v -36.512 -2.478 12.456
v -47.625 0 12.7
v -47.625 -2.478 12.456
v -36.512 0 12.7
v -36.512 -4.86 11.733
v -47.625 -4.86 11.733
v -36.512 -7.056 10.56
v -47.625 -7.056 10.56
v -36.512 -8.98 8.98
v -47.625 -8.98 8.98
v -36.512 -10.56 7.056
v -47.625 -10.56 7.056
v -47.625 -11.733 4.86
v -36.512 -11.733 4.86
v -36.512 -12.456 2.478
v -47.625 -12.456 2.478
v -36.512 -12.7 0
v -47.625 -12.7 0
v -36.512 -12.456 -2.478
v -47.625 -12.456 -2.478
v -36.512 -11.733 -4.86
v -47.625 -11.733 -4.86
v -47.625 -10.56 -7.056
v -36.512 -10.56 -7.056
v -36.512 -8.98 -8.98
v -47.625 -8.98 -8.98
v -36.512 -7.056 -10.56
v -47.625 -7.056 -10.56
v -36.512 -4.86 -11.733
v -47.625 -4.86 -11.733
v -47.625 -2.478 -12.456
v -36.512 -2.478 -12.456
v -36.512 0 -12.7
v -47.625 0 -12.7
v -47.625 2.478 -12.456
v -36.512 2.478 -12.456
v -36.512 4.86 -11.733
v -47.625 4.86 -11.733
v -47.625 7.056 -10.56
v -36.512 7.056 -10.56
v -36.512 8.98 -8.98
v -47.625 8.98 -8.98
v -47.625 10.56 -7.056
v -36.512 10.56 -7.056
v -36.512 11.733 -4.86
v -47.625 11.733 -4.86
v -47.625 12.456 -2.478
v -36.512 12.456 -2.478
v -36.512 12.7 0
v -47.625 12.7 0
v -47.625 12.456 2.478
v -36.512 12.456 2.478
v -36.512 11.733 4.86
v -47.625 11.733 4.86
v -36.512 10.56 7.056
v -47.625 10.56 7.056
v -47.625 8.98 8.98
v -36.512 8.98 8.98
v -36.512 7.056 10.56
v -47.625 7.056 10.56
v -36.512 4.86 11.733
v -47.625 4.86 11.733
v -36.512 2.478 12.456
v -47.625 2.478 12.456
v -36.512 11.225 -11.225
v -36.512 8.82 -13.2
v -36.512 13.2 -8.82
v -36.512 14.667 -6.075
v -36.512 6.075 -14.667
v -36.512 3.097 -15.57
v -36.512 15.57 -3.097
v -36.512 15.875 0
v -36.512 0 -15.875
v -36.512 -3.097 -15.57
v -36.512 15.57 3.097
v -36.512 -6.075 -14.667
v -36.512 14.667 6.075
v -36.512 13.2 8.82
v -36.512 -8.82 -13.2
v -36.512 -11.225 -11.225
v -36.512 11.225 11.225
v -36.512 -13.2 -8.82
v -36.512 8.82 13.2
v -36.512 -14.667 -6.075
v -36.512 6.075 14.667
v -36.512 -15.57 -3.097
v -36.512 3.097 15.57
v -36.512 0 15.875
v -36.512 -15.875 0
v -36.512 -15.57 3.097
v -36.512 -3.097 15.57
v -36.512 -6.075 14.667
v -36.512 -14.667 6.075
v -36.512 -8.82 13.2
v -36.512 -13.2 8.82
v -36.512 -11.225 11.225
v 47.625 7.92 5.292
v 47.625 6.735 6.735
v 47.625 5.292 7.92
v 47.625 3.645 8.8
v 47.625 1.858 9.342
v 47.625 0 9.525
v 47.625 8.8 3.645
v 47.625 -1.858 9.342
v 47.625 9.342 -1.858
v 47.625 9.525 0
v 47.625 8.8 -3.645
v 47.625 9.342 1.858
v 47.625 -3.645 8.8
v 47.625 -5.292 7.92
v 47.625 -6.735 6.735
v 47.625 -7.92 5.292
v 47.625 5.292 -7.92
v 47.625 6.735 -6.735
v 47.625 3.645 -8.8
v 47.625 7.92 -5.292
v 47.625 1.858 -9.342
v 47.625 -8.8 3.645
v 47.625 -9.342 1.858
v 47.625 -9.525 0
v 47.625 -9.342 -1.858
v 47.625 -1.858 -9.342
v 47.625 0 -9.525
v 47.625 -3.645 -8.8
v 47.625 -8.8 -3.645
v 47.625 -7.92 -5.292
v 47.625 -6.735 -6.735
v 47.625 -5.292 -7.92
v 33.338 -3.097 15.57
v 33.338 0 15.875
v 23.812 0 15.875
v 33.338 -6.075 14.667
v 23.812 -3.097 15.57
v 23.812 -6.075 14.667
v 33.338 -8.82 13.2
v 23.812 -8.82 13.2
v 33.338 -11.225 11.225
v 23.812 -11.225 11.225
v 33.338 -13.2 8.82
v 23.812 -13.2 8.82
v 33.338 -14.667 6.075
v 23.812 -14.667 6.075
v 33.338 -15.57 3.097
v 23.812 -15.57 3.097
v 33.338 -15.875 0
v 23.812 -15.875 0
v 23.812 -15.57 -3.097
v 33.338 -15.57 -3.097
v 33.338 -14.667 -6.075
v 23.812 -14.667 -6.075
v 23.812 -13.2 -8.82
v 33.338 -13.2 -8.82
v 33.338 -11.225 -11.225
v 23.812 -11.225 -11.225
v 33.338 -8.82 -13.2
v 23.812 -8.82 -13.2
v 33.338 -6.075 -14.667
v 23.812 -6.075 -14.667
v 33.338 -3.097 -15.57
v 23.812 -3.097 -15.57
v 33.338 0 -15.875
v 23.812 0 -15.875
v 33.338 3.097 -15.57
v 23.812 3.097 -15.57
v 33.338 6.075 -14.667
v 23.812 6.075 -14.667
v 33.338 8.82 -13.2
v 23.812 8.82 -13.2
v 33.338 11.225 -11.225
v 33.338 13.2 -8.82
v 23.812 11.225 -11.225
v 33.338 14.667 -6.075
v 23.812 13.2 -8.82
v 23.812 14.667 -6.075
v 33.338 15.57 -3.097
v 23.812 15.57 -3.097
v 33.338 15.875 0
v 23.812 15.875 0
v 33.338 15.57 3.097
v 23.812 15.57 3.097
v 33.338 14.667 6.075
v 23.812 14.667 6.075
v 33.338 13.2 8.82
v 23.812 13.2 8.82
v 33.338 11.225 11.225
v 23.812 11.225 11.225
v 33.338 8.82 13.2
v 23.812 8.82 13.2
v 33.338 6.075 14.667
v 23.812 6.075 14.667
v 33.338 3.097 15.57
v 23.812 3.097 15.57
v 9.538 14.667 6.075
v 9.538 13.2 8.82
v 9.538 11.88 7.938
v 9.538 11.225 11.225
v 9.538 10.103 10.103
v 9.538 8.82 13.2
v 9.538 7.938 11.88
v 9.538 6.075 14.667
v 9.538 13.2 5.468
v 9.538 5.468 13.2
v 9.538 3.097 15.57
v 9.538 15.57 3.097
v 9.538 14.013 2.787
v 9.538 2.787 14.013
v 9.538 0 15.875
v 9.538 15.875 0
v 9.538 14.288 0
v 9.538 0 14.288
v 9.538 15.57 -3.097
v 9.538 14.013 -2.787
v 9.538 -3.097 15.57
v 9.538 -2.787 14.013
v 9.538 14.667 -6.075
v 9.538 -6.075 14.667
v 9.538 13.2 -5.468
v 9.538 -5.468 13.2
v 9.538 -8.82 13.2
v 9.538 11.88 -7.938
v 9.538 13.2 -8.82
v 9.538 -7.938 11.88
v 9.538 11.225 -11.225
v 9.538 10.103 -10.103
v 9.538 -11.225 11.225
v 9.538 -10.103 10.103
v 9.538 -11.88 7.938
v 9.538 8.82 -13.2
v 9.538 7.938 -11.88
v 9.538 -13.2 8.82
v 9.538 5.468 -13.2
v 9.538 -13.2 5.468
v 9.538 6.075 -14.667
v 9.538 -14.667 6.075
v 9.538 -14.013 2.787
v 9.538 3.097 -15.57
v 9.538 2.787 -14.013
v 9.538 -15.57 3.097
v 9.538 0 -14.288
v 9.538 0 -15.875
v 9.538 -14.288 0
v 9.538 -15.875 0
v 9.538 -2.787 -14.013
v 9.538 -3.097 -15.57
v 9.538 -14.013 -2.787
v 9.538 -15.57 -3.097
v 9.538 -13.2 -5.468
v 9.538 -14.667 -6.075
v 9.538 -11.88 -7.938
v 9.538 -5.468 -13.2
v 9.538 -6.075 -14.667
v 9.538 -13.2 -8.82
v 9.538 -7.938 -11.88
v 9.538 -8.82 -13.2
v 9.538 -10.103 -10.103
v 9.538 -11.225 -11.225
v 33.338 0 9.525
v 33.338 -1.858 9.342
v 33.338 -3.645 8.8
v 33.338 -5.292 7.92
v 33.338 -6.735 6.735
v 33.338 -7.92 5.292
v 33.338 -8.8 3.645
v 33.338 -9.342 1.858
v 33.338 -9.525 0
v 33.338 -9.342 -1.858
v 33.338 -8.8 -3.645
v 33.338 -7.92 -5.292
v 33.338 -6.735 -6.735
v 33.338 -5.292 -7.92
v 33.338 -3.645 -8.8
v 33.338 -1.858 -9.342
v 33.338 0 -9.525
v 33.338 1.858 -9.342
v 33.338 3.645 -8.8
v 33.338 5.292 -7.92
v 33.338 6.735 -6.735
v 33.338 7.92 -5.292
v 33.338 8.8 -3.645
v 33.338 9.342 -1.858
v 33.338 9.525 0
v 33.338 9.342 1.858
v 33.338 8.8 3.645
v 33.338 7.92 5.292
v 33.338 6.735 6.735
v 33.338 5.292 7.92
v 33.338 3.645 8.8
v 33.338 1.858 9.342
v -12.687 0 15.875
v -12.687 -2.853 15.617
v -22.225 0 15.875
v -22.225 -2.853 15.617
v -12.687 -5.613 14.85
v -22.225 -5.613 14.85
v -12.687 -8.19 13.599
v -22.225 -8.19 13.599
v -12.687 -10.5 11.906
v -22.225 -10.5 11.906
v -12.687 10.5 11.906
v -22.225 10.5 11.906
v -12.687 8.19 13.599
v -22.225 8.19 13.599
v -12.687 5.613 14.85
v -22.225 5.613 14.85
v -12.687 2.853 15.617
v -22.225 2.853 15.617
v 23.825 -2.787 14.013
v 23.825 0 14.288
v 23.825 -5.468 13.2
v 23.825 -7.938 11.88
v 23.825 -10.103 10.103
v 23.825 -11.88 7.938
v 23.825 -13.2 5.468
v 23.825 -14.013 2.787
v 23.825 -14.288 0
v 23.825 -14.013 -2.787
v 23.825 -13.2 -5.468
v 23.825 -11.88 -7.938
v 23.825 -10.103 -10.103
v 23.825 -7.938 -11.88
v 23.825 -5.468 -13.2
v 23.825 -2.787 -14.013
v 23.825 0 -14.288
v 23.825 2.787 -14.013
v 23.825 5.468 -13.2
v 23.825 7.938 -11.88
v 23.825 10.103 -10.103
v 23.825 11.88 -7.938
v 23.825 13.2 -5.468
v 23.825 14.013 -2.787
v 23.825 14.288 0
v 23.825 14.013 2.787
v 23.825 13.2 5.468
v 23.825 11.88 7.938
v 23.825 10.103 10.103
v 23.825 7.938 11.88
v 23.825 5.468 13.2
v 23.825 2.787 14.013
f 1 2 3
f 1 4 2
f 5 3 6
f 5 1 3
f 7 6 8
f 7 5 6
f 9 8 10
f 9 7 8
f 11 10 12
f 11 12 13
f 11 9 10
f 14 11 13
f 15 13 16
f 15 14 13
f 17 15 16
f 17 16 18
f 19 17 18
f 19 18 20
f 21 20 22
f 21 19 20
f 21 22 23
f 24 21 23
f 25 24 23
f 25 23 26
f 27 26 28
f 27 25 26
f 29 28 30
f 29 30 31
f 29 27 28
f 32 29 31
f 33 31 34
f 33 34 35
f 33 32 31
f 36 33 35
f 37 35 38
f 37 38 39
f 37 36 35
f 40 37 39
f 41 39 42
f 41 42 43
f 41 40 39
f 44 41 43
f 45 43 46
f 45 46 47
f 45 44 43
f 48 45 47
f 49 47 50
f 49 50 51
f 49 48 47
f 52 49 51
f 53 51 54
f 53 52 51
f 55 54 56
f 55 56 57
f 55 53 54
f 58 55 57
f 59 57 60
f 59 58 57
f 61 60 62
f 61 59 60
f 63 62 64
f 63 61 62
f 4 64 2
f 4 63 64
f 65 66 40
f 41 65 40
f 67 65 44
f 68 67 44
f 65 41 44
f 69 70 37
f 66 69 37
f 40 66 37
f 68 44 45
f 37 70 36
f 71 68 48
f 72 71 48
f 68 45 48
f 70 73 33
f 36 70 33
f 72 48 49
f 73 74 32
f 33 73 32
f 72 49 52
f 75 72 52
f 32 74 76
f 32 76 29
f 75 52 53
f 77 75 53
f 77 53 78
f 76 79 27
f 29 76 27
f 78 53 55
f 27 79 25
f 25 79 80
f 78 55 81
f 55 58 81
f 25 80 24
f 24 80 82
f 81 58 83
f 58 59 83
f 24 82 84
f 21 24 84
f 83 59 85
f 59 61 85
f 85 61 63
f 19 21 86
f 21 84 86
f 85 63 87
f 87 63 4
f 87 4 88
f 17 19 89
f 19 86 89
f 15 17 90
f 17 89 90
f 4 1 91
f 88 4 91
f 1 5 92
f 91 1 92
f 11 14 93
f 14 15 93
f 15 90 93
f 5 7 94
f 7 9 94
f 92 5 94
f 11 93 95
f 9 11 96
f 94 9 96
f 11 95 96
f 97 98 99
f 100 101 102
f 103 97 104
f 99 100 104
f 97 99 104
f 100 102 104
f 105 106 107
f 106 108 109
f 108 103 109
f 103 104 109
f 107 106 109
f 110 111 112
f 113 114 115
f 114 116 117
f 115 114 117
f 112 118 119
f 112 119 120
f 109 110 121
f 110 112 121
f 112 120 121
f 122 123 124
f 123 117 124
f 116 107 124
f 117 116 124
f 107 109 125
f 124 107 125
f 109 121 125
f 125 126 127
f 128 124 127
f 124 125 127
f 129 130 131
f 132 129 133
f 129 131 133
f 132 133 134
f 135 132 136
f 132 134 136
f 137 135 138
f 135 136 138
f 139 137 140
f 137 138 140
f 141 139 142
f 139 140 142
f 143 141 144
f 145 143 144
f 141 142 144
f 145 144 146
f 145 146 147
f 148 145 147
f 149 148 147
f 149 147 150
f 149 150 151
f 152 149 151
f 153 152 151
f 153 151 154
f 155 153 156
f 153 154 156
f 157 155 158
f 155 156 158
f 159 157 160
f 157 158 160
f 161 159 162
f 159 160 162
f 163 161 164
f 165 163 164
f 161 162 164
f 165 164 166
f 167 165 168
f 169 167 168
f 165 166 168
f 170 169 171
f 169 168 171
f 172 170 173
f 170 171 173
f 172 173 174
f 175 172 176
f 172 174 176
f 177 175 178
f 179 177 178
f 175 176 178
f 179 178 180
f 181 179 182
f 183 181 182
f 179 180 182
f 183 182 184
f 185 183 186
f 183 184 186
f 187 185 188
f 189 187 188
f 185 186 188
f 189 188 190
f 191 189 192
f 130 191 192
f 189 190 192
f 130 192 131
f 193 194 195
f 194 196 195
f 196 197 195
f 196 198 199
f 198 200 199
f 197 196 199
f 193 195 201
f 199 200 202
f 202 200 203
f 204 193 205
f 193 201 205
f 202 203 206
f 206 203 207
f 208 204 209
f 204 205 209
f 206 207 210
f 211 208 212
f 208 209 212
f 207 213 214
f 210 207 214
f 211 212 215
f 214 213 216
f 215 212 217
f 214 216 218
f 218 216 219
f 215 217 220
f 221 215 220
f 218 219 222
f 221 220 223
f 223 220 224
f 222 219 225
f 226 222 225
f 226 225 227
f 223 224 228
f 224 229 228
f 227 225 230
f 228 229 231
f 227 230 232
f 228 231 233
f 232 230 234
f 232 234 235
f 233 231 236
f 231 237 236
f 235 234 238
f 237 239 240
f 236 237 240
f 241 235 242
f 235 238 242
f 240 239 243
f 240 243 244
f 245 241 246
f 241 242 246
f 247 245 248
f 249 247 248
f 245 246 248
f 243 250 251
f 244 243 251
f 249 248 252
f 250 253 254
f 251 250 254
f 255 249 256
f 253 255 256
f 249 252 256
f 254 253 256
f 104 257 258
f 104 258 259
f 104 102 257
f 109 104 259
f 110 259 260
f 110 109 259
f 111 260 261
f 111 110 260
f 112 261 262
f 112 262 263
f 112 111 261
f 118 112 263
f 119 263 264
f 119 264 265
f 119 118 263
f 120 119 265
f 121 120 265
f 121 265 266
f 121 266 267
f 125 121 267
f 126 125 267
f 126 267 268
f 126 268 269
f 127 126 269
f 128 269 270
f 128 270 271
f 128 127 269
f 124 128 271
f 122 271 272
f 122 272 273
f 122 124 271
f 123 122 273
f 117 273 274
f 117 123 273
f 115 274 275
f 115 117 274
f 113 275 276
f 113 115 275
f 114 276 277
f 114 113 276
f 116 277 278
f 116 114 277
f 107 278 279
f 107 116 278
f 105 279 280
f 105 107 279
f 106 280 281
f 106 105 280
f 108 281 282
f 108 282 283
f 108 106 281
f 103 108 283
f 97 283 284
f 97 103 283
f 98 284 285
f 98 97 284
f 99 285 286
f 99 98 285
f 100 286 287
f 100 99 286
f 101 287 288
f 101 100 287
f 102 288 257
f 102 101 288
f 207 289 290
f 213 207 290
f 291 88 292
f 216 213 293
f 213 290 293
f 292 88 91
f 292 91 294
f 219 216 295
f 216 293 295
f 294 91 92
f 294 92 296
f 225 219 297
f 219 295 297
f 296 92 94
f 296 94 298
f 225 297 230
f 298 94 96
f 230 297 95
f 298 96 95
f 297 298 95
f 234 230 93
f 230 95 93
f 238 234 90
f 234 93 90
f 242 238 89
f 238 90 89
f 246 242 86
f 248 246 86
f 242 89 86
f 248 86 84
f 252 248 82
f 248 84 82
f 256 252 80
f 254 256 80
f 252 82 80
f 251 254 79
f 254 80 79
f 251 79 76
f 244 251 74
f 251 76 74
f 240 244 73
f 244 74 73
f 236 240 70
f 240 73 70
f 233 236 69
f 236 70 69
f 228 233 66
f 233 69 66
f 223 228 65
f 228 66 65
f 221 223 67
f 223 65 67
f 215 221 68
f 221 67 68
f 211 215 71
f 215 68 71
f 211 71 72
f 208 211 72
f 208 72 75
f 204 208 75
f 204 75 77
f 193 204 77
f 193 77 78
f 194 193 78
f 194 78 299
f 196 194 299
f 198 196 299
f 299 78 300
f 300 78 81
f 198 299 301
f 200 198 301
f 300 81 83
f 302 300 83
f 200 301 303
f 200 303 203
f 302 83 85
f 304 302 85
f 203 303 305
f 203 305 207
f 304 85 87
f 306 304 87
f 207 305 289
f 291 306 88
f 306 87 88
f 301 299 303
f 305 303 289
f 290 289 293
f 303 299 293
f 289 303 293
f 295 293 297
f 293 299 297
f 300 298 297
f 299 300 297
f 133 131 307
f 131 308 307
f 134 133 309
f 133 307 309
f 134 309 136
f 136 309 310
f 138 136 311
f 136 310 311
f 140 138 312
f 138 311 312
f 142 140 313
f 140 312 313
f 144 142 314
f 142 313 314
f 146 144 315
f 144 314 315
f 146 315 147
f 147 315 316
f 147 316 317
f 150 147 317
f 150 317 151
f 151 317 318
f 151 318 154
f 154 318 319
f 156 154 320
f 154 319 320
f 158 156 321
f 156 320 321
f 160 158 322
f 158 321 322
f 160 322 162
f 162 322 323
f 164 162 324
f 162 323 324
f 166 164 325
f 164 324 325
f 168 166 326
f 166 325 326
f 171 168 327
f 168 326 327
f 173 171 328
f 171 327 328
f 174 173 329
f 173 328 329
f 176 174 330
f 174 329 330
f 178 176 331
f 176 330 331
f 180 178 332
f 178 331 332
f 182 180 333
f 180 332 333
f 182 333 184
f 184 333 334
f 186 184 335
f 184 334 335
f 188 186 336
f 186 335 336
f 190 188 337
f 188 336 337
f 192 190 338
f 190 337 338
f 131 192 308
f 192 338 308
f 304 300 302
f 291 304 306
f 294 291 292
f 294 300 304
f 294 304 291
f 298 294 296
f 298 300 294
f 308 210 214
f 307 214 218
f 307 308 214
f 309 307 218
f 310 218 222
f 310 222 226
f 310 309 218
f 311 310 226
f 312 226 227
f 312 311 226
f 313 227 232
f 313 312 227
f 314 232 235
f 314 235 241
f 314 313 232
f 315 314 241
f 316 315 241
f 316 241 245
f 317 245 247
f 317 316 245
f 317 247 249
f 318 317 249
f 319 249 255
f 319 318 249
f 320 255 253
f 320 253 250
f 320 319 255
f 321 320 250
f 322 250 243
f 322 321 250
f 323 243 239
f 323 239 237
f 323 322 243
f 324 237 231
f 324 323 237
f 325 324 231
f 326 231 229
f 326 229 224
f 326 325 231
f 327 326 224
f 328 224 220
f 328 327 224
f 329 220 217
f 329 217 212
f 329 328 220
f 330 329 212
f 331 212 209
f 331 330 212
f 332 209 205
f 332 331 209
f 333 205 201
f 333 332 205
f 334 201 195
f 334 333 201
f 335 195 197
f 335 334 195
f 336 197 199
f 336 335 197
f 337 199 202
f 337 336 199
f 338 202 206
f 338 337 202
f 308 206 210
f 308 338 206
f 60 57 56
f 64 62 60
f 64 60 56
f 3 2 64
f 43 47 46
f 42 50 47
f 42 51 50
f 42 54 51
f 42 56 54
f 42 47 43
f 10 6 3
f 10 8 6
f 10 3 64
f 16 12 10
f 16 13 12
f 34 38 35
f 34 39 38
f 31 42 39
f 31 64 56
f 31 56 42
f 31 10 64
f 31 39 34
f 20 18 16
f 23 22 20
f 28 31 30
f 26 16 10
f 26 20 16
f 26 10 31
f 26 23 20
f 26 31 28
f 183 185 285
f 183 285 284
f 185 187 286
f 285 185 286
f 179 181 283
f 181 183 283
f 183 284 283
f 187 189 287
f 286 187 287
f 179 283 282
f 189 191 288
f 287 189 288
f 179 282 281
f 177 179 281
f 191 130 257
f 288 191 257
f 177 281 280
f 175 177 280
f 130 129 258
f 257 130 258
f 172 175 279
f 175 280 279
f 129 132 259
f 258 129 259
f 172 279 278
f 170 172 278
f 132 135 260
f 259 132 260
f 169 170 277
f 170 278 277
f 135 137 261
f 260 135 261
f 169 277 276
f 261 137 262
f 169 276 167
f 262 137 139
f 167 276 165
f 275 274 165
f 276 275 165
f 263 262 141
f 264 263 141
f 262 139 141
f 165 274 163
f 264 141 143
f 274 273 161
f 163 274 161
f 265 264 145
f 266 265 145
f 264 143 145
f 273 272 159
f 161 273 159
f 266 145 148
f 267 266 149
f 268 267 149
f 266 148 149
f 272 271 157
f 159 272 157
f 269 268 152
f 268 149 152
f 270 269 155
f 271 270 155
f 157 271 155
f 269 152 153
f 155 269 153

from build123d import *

# Parameters (mm, degrees)
F0_W     = 11.1125
F0_H     = 12.7
F0_W_2   = 14.2875
F0_H_2   = 14.2875
F0_H_3   = 9.525
F2_W     = 9.5377
F2_H     = 23.704022
F3_DEPTH = 63.5


with BuildPart() as f1:
    # F0 (on Front) → F1 (revolve)
    with BuildSketch(Plane.XZ):
        with Locations((-42.06875, 6.35)):
            Rectangle(F0_W, F0_H)
        Polygon((-36.5125, 12.7), (-36.5125, 0), (9.5377, 0), (9.5377, 14.2875), (9.5377, 15.875), (-36.5125, 15.875), align=None)
        with Locations((16.68145, 7.14375)):
            Rectangle(F0_W_2, F0_H_2)
        Polygon((23.8252, 14.2875), (23.8252, 0), (33.3375, 0), (33.3375, 9.525), (33.3375, 15.875), (23.8125, 15.875), align=None)
        with Locations((40.48125, 4.7625)):
            Rectangle(F0_W_2, F0_H_3)
    revolve(axis=Axis((0, 0, 0), (1, 0, 0)))

    # F2 (on Front) → F3 (cut, symmetric)
    with BuildSketch(Plane.XZ):
        with Locations((-17.45615, 23.758261)):
            Rectangle(F2_W, F2_H)
    extrude(amount=F3_DEPTH, both=True, mode=Mode.SUBTRACT)


solid = f1.part
